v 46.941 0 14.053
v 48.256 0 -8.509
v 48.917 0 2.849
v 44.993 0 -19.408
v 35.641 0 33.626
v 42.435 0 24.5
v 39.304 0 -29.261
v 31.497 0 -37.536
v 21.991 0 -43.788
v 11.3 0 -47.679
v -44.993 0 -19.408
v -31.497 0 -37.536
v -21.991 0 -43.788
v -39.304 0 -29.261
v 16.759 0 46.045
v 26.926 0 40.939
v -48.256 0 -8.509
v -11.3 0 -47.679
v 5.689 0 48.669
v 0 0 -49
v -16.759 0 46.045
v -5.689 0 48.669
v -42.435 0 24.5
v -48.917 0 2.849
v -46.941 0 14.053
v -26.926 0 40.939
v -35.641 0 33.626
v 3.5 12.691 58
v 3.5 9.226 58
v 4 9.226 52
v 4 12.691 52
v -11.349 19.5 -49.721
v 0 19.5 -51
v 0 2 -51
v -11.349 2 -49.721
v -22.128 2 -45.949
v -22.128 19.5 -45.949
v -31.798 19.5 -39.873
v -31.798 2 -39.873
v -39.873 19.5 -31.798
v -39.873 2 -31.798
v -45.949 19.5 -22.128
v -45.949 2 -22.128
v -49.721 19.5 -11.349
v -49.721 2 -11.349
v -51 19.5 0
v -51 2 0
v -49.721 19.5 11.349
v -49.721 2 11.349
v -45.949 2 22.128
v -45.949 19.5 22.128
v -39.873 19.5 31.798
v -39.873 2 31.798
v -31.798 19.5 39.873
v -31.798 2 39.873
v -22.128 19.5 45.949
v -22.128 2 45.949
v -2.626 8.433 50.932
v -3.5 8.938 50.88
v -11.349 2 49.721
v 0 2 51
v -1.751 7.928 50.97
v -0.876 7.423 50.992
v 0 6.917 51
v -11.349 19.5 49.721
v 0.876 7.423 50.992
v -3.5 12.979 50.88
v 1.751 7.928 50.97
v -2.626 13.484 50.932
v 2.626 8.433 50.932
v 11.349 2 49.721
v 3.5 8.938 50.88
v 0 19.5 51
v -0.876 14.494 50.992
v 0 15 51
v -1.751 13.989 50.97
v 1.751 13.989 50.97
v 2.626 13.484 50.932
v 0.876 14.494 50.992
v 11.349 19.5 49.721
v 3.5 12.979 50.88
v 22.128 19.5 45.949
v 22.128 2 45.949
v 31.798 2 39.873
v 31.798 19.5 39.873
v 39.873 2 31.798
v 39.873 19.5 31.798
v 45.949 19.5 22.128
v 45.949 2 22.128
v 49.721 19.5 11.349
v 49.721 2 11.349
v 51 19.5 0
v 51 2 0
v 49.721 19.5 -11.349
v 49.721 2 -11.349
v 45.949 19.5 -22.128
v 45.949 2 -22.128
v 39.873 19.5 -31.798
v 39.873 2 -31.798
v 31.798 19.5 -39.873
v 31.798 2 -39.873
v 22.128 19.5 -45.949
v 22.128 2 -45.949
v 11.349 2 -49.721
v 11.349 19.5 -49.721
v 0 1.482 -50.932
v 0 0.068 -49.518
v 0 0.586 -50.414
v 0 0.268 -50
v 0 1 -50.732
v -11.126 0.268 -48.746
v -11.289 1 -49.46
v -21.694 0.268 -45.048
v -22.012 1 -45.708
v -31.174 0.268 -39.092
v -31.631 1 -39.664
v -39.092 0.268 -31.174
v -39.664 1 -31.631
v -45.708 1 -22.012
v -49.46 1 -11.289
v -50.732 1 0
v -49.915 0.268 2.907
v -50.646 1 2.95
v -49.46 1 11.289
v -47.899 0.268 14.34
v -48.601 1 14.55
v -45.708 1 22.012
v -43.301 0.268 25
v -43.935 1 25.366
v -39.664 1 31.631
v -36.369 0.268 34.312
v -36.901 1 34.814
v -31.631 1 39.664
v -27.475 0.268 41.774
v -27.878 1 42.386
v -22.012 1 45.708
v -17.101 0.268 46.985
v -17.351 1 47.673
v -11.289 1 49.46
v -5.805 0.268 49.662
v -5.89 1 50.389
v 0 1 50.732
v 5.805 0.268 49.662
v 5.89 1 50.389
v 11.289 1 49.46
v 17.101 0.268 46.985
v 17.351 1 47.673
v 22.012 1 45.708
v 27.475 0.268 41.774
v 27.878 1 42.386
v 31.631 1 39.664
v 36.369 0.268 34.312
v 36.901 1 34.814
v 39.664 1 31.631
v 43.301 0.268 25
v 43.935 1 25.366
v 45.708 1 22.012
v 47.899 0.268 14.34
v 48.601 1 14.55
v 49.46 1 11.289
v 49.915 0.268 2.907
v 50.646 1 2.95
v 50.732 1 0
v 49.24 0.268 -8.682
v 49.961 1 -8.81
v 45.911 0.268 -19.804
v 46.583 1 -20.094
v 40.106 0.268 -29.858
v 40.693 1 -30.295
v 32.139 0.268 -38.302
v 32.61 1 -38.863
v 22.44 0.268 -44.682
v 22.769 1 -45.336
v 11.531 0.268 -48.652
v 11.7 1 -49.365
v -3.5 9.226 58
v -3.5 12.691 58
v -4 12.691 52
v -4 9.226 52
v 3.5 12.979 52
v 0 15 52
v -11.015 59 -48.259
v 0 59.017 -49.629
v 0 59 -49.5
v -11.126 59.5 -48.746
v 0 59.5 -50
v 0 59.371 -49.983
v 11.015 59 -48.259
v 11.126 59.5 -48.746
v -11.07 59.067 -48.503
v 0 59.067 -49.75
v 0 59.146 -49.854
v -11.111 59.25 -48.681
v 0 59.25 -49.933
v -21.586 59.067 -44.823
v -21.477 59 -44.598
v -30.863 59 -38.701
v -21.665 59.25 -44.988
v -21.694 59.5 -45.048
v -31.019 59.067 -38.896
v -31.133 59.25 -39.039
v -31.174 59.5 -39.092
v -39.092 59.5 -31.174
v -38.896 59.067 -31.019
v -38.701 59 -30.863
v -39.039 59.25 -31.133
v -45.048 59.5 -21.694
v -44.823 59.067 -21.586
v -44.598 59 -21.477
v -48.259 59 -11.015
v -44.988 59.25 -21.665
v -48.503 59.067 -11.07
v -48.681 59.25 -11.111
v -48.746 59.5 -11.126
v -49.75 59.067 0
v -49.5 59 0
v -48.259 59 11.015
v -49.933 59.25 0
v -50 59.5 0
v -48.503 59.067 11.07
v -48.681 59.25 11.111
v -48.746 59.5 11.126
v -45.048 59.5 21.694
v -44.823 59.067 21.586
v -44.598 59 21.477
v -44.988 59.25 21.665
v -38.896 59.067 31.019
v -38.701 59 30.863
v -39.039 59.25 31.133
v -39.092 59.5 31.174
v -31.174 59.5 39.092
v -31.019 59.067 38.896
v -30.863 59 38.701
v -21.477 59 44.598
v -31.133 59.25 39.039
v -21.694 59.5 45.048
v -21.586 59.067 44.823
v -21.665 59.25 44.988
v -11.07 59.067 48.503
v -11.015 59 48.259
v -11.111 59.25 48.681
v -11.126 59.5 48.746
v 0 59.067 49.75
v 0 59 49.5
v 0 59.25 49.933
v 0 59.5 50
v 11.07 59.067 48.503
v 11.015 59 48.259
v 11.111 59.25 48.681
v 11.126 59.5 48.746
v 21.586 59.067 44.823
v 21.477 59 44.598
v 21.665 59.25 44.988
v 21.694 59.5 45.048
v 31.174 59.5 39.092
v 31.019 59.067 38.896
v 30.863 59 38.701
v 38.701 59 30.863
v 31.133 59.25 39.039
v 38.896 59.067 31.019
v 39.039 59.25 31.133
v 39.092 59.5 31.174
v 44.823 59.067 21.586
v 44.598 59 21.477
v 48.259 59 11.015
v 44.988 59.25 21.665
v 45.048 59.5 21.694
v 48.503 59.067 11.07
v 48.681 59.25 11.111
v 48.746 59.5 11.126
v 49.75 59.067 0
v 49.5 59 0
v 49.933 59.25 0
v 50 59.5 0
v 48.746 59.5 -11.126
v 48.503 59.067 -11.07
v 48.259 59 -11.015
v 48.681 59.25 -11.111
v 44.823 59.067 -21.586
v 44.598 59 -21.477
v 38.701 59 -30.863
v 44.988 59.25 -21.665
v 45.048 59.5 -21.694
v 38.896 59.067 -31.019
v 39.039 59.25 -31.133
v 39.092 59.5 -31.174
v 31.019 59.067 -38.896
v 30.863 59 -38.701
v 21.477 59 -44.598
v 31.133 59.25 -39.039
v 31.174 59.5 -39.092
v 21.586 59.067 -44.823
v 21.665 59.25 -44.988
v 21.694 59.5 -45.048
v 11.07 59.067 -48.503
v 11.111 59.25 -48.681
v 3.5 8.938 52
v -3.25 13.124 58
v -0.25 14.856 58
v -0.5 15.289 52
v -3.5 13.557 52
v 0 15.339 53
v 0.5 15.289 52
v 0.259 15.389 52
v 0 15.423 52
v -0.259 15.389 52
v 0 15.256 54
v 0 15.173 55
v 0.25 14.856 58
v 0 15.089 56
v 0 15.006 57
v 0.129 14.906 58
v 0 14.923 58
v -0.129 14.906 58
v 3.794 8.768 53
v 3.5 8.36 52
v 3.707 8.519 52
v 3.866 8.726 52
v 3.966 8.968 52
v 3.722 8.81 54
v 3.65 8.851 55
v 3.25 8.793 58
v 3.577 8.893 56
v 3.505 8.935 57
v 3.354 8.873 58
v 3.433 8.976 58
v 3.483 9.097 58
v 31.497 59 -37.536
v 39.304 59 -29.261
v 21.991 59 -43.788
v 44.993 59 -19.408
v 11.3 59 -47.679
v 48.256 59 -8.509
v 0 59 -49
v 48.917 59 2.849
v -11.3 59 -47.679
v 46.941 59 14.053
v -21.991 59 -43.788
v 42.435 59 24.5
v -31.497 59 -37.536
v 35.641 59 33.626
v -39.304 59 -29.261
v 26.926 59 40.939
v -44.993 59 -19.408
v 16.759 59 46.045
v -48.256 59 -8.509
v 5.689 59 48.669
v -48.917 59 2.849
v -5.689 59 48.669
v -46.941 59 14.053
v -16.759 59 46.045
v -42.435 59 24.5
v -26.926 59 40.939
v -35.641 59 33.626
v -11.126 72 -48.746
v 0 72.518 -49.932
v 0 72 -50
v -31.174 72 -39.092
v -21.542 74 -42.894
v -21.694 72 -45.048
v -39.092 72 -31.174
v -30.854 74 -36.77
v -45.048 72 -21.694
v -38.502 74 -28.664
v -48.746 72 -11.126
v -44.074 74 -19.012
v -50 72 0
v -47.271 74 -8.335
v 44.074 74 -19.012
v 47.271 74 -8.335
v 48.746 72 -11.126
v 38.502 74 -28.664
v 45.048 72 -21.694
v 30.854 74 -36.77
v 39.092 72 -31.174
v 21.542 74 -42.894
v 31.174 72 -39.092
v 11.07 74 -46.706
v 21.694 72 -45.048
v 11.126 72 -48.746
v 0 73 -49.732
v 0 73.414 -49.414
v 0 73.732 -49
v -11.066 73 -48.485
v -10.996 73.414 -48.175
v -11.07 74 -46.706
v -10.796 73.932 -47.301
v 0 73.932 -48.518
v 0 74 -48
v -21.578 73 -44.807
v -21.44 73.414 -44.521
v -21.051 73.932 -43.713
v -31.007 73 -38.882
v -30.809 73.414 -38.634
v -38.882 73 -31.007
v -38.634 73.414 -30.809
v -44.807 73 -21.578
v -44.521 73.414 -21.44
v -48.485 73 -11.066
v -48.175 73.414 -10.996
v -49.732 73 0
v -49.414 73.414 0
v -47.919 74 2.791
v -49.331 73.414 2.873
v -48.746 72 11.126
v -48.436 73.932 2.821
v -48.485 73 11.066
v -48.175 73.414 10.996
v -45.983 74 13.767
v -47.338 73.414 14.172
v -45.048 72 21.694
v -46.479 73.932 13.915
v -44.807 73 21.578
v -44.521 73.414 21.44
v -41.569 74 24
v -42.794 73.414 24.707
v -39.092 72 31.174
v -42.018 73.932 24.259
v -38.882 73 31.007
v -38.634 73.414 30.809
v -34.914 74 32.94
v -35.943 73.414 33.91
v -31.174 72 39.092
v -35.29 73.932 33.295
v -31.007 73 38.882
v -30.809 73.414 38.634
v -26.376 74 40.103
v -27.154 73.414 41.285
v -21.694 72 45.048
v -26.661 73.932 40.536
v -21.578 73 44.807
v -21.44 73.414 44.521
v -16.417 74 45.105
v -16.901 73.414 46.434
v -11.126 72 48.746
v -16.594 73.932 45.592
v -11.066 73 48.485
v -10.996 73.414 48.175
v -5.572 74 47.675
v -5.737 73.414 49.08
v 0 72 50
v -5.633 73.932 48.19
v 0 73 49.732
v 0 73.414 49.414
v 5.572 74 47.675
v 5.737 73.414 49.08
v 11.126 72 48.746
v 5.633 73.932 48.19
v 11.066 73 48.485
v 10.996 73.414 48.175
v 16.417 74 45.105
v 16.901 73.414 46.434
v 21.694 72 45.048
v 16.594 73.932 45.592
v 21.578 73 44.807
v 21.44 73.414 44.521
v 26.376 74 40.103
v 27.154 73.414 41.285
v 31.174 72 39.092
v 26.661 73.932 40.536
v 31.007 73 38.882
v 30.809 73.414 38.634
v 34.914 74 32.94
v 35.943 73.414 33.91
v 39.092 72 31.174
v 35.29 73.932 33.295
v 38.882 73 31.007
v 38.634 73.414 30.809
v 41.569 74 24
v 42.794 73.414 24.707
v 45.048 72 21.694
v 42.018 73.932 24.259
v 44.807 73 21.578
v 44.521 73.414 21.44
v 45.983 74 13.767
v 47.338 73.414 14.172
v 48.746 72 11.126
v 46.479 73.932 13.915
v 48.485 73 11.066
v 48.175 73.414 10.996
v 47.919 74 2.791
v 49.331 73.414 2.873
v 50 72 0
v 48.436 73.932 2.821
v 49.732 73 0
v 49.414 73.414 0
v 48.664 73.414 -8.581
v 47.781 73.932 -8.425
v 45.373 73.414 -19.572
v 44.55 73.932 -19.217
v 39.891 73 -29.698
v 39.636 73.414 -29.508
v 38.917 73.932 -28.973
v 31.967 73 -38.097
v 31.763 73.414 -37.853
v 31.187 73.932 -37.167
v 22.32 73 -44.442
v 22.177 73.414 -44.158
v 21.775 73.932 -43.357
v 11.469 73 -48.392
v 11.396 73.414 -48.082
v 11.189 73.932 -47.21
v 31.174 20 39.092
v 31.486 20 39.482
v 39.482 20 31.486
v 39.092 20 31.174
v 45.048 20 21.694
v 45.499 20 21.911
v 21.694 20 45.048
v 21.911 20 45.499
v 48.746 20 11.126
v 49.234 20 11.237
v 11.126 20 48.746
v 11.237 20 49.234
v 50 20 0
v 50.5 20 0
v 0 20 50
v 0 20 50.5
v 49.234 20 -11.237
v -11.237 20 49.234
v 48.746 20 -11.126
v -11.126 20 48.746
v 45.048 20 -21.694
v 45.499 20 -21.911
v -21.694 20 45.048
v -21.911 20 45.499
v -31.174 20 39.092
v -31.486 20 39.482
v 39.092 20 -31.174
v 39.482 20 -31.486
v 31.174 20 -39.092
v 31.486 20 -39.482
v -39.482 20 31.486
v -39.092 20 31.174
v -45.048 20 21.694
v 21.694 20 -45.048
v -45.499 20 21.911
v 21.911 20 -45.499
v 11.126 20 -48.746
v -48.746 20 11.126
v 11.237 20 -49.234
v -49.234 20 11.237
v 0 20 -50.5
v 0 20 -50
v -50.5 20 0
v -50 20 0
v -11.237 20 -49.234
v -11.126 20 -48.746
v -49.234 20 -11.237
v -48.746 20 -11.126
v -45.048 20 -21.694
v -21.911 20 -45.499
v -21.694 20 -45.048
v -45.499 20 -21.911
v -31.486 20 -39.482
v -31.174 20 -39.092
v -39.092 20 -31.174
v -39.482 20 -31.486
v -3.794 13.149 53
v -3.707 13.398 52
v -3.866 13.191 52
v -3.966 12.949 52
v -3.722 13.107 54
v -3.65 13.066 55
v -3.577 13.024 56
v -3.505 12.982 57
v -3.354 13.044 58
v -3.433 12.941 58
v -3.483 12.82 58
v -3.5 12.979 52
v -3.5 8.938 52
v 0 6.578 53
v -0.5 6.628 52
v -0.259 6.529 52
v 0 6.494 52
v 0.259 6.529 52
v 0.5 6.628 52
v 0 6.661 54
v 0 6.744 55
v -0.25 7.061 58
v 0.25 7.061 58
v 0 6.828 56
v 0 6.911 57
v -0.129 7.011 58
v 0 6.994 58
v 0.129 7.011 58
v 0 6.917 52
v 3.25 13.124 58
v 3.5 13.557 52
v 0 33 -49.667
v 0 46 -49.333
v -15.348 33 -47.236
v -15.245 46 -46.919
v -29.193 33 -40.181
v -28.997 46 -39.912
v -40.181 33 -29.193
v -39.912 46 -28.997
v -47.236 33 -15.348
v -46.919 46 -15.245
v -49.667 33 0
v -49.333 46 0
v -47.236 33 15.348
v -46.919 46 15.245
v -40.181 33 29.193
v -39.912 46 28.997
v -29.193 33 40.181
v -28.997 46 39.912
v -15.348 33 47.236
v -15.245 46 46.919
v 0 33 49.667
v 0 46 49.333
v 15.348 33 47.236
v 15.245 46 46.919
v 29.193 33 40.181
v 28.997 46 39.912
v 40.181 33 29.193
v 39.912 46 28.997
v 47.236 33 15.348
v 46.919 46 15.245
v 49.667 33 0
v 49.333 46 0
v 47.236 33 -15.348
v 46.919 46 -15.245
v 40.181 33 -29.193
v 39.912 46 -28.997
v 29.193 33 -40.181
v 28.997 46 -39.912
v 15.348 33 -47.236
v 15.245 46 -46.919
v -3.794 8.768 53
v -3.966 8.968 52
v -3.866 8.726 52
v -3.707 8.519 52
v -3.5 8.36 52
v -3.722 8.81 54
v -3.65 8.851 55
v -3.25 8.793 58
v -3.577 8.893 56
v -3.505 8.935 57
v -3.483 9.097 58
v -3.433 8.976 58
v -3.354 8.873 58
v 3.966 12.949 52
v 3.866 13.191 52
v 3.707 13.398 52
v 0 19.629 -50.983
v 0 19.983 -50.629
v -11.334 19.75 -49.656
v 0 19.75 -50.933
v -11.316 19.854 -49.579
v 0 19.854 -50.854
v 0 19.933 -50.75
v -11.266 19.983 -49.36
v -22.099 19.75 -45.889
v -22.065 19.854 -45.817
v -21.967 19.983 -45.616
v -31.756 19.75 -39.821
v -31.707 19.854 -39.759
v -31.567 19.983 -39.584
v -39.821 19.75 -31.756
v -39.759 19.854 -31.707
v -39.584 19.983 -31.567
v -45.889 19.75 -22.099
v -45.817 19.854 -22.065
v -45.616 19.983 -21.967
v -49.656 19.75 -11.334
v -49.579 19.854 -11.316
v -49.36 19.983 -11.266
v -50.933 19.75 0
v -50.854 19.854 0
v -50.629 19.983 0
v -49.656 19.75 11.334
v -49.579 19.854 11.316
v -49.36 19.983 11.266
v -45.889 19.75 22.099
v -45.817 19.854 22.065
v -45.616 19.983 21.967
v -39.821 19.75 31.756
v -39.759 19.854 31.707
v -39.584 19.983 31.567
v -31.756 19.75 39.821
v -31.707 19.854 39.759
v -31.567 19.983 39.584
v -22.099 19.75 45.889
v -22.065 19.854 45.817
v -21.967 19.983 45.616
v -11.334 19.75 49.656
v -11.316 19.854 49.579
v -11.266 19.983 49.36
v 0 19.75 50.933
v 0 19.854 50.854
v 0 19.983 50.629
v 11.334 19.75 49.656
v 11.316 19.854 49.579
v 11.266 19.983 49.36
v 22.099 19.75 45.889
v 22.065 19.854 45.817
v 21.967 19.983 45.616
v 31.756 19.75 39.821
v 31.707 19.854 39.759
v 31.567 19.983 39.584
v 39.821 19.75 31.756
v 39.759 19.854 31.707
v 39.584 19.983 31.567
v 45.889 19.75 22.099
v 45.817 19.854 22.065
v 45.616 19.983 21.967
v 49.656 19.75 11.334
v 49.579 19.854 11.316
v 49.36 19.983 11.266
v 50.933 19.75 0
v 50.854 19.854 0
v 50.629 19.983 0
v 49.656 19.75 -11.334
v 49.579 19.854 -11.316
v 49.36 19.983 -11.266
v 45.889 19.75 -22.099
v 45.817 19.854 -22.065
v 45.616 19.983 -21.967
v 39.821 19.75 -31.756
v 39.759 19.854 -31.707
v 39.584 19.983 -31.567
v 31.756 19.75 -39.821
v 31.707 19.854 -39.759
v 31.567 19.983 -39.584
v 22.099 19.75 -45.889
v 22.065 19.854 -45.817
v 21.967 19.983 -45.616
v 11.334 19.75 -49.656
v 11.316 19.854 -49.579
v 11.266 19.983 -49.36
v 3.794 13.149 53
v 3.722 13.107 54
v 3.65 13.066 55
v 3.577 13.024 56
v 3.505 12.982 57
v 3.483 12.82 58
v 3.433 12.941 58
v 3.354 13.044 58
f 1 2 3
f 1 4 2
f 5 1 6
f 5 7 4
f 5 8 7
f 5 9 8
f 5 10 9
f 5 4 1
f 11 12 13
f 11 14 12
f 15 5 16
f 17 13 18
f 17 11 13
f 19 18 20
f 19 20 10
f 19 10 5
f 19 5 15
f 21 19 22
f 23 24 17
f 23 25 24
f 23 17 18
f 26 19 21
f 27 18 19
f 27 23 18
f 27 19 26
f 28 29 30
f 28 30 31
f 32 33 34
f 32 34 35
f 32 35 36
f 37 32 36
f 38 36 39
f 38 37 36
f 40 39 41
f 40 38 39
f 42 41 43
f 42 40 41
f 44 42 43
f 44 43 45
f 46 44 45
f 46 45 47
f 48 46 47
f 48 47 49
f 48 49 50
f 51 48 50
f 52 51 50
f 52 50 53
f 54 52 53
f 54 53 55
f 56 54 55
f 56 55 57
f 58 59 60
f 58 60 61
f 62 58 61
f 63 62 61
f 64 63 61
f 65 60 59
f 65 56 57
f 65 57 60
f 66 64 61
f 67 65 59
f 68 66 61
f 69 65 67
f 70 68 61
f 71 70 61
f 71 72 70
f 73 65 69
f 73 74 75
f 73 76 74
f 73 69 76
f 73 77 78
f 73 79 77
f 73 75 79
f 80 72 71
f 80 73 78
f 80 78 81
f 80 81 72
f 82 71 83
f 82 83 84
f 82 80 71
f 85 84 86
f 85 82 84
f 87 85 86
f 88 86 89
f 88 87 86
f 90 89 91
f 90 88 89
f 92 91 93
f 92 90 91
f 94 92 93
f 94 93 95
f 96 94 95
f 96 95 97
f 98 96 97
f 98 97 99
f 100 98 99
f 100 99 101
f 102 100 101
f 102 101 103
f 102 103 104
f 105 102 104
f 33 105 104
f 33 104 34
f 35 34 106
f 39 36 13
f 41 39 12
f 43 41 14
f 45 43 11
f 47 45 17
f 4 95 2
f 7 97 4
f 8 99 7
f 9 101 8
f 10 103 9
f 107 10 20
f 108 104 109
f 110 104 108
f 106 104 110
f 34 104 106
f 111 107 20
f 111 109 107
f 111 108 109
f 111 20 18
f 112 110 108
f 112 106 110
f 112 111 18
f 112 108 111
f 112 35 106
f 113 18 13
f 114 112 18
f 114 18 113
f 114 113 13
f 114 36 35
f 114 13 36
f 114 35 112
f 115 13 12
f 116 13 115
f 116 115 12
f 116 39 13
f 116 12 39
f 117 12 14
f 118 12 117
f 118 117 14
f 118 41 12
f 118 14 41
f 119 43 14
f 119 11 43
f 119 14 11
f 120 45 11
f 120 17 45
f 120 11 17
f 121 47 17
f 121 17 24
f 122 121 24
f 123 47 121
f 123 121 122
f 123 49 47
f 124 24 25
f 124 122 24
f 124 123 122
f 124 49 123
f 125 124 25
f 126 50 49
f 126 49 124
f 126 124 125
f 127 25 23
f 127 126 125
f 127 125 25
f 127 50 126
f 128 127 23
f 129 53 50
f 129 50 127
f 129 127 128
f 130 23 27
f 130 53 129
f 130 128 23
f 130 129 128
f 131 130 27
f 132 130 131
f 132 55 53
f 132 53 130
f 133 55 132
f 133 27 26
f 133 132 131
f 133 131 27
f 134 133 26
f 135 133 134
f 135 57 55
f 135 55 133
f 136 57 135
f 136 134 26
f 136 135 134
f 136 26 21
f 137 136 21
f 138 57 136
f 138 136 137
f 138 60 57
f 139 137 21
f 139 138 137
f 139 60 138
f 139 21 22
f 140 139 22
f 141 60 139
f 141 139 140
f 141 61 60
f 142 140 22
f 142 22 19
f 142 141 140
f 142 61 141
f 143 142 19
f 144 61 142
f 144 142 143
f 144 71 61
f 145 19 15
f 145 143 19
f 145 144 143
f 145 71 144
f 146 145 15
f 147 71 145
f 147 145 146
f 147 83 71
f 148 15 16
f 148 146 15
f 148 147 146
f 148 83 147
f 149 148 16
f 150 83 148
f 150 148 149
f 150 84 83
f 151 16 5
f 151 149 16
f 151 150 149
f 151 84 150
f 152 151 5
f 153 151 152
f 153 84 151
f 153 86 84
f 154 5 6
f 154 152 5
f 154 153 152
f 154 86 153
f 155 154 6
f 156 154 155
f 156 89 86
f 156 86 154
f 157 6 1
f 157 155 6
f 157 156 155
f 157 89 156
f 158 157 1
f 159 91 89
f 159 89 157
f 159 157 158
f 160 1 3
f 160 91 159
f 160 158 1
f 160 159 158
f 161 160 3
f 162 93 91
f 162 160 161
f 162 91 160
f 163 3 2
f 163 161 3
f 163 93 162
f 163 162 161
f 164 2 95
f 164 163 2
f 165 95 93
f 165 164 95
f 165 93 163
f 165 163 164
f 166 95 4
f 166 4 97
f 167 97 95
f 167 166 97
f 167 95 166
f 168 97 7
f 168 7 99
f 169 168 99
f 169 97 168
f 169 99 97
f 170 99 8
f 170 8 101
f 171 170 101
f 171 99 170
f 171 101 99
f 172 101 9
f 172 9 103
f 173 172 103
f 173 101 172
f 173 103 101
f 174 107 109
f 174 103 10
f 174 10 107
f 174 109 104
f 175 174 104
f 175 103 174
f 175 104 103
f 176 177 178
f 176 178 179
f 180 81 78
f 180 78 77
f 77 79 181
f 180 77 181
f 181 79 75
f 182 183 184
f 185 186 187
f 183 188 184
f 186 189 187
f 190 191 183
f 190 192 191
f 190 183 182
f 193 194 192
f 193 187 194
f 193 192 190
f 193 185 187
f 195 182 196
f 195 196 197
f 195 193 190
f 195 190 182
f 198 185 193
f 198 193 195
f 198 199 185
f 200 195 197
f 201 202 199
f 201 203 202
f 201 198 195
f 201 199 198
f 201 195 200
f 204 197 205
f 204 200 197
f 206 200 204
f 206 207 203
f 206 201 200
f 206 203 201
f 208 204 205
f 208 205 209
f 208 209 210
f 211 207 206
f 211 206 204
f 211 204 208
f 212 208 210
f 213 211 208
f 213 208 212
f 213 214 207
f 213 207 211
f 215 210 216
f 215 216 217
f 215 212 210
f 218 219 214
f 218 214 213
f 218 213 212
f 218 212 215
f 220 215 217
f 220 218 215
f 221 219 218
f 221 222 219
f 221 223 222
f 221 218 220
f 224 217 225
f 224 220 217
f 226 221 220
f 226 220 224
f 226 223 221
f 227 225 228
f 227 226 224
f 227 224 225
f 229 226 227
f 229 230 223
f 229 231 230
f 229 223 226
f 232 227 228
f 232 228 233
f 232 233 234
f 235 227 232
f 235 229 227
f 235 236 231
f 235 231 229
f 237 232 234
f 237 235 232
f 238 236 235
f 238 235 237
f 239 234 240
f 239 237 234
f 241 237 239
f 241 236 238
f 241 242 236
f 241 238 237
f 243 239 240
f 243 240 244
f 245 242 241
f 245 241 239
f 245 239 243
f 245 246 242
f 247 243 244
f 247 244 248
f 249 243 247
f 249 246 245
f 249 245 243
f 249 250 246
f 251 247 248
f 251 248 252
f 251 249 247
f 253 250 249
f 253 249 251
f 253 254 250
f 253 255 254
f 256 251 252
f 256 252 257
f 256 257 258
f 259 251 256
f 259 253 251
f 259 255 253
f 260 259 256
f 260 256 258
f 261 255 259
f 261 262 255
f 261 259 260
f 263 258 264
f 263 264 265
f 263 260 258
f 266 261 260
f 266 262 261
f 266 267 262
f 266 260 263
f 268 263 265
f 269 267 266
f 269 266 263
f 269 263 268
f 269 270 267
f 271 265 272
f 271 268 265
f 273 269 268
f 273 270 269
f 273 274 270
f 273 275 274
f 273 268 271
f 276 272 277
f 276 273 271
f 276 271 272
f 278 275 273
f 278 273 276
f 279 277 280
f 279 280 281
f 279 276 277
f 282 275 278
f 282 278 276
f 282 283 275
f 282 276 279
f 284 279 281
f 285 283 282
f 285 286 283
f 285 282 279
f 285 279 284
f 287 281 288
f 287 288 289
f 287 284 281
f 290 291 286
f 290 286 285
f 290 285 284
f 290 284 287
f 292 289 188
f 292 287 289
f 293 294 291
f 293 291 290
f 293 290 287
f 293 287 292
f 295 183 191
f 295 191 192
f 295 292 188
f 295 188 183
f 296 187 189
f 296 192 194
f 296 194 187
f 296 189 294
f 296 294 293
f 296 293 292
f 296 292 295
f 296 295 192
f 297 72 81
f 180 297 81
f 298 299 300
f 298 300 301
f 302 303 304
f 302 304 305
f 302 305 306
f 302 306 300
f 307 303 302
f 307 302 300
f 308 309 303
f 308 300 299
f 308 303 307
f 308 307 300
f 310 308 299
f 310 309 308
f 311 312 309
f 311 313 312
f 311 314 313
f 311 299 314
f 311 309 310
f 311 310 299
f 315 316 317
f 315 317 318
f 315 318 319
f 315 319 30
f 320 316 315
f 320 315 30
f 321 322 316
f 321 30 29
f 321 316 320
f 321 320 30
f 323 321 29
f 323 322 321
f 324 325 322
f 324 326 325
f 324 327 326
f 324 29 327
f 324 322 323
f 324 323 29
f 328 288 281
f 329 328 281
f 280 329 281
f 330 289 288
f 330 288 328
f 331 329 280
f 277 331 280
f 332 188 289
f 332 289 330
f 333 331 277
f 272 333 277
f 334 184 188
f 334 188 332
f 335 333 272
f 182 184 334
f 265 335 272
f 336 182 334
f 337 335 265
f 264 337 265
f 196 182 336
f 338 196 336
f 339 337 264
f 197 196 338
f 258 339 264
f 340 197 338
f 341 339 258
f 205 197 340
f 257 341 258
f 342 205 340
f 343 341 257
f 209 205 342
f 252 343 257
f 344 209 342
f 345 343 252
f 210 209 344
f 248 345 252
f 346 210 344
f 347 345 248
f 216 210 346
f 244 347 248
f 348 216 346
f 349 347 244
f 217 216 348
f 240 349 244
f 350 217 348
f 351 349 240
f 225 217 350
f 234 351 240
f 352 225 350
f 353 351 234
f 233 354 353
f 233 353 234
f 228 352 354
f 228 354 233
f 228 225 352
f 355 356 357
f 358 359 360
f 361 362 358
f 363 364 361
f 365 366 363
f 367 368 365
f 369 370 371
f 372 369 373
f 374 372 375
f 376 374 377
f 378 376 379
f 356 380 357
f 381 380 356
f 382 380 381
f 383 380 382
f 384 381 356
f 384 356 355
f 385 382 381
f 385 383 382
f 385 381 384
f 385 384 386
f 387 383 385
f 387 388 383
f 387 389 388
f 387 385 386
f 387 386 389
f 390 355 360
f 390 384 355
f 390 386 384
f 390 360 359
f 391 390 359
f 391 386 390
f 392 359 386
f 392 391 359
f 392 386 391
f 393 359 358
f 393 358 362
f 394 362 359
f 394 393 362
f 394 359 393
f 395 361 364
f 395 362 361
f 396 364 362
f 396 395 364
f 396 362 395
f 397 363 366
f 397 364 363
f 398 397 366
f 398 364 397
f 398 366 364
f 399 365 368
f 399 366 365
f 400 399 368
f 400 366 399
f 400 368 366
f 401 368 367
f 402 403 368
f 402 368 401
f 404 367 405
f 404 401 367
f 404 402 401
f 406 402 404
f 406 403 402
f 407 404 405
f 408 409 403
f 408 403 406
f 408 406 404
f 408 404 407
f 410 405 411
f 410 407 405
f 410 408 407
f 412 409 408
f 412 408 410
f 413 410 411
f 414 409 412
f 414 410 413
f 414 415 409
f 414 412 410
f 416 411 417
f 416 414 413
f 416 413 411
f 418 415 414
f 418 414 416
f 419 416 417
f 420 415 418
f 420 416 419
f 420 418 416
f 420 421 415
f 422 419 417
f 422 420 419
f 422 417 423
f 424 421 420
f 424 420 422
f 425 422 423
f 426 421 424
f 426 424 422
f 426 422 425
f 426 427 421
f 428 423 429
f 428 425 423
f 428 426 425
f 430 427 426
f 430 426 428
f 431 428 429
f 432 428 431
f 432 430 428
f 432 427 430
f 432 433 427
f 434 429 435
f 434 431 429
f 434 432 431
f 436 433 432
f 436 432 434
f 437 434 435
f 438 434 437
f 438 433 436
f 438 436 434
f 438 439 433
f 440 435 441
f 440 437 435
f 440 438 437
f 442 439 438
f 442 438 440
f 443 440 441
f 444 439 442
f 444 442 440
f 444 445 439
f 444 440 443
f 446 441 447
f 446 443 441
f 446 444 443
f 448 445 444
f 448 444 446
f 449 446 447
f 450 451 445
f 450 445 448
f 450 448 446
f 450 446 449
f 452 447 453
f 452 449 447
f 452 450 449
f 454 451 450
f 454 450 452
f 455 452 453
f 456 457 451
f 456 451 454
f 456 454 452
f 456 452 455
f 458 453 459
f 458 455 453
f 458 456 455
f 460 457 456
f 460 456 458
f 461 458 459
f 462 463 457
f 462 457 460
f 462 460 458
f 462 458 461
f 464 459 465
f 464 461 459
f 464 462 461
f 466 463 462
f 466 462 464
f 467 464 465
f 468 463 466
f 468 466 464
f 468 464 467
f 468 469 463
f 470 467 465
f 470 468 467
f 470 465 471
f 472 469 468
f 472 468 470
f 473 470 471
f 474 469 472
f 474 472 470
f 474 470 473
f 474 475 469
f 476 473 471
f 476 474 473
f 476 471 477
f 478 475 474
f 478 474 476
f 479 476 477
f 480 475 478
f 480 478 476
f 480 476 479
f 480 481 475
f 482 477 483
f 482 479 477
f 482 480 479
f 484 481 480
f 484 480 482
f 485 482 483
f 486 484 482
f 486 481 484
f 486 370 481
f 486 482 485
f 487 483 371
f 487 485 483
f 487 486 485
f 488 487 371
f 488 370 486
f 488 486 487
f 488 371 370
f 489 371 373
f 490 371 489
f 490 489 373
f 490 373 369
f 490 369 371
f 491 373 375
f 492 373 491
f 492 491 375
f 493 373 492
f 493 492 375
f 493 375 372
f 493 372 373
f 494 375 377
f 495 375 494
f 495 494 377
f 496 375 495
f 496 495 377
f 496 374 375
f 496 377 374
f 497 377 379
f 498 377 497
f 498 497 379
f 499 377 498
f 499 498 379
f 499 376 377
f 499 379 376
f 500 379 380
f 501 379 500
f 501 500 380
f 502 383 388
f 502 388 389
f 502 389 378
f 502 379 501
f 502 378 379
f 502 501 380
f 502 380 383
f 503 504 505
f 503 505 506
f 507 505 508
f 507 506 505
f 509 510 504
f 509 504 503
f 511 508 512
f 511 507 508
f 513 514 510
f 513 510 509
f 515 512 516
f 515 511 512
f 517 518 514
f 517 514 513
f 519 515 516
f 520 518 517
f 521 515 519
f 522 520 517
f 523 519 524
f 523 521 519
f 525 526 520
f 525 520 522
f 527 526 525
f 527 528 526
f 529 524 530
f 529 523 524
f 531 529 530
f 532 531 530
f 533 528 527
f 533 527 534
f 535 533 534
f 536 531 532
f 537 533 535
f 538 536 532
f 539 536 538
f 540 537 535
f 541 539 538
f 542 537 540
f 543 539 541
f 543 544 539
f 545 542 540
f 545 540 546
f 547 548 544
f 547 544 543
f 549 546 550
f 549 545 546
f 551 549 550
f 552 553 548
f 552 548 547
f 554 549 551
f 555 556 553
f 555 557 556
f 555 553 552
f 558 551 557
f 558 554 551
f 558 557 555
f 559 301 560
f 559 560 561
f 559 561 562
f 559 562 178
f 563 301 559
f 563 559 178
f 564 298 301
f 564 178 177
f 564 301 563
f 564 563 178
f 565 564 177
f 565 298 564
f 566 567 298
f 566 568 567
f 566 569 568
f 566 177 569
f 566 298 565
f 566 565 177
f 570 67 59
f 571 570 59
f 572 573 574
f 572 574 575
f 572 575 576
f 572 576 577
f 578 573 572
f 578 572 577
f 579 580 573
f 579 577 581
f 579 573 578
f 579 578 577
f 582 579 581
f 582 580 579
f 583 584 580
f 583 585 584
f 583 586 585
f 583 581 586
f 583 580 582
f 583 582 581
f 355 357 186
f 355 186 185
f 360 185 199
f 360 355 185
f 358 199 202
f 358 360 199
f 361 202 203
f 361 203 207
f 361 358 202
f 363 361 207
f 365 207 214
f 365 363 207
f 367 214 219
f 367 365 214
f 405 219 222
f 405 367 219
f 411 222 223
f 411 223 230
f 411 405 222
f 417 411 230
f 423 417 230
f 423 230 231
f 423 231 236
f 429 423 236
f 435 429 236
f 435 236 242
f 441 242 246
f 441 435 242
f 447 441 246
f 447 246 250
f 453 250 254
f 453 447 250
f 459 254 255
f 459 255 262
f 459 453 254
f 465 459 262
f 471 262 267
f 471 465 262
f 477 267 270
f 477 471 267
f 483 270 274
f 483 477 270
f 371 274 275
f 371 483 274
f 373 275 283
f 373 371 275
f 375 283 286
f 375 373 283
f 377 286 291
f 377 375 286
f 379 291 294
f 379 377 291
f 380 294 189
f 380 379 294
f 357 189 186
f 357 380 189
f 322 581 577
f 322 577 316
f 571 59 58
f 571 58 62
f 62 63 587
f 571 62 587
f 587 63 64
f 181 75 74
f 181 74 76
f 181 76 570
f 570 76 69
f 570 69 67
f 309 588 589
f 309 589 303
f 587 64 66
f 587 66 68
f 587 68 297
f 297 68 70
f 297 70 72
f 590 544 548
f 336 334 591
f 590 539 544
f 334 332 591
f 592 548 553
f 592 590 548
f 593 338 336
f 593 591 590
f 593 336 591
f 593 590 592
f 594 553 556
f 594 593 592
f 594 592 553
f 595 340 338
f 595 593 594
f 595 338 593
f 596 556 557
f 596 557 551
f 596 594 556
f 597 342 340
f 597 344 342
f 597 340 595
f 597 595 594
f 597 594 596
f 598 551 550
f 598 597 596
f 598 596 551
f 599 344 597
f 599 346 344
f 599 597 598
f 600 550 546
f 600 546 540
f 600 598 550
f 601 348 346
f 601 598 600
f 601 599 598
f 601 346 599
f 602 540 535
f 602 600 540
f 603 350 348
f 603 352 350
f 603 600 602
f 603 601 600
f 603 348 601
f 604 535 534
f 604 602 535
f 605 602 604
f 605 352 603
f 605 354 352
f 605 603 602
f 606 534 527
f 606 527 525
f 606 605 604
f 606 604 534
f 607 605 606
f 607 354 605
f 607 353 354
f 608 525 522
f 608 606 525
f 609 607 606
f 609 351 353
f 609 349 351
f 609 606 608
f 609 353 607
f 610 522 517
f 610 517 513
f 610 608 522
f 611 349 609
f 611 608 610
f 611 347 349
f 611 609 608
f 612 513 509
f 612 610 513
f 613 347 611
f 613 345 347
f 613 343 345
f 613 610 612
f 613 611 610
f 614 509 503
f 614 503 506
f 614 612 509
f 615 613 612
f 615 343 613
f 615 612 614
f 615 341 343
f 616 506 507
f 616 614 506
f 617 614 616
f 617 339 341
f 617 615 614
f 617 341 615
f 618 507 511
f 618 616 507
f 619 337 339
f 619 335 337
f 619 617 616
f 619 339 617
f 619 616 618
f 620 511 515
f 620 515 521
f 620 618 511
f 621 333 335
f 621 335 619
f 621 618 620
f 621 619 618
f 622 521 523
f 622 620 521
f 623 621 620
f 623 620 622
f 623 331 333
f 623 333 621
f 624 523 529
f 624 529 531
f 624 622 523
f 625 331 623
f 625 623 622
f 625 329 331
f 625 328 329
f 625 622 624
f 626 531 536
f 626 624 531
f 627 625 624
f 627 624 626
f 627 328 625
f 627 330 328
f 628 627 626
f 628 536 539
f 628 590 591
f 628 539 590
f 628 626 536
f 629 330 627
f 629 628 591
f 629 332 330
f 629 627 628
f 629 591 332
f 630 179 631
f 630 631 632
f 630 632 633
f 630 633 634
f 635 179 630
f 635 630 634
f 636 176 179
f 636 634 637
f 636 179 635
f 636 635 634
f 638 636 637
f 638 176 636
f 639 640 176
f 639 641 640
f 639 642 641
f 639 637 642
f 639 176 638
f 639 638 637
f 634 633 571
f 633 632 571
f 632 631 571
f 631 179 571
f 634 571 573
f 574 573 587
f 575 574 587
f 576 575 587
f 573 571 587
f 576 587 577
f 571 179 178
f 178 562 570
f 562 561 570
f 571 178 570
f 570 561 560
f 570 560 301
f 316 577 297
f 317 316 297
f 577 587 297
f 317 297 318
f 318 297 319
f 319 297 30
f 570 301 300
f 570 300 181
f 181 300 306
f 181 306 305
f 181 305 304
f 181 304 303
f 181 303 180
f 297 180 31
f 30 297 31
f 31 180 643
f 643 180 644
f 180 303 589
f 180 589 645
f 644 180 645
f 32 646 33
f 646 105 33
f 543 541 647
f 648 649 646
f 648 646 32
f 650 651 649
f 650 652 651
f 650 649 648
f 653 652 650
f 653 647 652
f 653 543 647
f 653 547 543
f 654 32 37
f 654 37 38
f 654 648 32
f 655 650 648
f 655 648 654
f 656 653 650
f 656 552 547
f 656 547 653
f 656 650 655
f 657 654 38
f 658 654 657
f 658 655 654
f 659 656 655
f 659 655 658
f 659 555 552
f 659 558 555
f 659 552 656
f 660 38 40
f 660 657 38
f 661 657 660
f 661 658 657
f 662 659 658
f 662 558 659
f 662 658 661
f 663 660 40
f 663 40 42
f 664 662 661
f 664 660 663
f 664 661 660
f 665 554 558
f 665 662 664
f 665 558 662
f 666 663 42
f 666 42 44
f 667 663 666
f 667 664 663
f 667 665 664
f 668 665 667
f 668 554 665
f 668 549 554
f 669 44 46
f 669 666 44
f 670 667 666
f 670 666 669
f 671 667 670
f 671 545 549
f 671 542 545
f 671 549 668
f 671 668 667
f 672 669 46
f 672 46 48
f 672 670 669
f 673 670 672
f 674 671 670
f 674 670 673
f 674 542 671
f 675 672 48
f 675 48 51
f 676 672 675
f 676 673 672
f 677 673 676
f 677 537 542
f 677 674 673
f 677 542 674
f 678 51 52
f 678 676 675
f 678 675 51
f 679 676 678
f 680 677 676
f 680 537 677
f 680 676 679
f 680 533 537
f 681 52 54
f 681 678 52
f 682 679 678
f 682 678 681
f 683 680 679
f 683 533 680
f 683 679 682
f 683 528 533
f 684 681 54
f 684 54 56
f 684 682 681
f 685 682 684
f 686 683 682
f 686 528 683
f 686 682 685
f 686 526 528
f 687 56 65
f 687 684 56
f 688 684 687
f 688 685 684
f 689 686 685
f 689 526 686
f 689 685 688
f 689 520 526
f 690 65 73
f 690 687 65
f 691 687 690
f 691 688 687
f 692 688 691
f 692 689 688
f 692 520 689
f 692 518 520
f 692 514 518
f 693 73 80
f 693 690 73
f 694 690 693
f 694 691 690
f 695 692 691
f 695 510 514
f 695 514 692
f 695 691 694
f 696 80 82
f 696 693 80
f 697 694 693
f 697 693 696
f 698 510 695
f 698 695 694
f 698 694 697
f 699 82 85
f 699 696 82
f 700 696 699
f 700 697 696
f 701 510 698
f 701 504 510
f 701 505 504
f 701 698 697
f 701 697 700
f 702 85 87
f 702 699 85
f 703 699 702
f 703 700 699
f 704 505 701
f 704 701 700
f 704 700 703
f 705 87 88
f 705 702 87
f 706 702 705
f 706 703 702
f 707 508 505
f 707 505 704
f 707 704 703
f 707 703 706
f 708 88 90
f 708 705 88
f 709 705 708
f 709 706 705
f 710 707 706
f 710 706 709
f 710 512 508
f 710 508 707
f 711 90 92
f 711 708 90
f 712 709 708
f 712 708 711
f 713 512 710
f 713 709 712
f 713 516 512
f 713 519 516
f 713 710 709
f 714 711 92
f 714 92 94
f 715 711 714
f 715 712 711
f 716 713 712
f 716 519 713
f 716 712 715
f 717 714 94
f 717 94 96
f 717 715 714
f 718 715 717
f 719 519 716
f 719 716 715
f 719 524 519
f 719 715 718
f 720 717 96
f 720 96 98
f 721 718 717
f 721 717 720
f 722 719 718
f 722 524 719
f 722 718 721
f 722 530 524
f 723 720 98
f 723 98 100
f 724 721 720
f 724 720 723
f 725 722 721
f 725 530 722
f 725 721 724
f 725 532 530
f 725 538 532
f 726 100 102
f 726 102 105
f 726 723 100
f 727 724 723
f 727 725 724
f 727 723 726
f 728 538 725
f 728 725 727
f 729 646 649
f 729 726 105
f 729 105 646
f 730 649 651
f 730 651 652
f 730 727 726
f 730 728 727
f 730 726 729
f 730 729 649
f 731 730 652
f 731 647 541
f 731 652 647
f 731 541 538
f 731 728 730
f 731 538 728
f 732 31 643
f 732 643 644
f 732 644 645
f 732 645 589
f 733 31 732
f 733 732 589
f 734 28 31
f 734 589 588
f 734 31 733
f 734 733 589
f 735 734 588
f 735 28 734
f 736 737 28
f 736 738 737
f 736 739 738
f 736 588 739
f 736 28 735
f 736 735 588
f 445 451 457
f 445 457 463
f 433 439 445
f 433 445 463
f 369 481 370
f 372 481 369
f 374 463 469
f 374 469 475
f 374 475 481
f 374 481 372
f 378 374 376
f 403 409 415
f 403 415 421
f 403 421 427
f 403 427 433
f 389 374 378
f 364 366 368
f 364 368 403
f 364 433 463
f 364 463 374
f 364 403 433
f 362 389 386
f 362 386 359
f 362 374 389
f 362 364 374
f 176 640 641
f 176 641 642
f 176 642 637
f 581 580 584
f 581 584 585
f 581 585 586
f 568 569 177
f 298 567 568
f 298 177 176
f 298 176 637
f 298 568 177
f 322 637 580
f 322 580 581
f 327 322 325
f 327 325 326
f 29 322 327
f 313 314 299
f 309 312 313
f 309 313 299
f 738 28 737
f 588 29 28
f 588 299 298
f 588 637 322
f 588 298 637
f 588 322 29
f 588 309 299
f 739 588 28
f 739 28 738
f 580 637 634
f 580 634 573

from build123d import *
from OCP.BRepFilletAPI import BRepFilletAPI_MakeChamfer

# Parameters (mm, degrees)
FILLET_1_R       = 2
FILLET_2_R       = 0.5
EXTRUDE_1_DEPTH  = 52
EXTRUDE_2_DEPTH  = 6
FILLET_3_R       = 1
CHAMFER_1_SIZE   = 6
CHAMFER_1_SIZE_2 = 0.5


with BuildPart() as part:
    # 스케치1 → 회전1 (revolve)
    with BuildSketch(Plane.XY, mode=Mode.PRIVATE) as revolve_1_sk:
        Polygon((0, 0), (51, 0), (51, 20), (50, 20), (49, 59), (50, 59), (50, 74), (0, 74), align=None)
    revolve(revolve_1_sk.sketch.rotate(Axis((0, 0, 0), (0, 1, 0)), 90), axis=Axis((0, 0, 0), (0, 1, 0)))

    # 필렛1
    fillet_1_edges = [part.edges().sort_by_distance(p)[0] for p in [
        (0, 74, 50),
        (0, 0, 51),
    ]]
    fillet(fillet_1_edges, radius=FILLET_1_R)

    # 필렛2
    fillet_2_edges = [part.edges().sort_by_distance(p)[0] for p in [
        (0, 59, 50),
        (0, 20, 51),
    ]]
    fillet(fillet_2_edges, radius=FILLET_2_R)

    # 스케치2 → 보스-돌출1 (add)
    with BuildSketch(Plane.XY):
        Polygon((0, 6.917096231), (3.5, 8.937822174), (3.5, 12.979274058), (0, 15), (-3.5, 12.979274058), (-3.5, 8.937822174), align=None)
    extrude(amount=EXTRUDE_1_DEPTH)

    # 스케치3 → 보스-돌출2 (add)
    with BuildSketch(Plane.XY.offset(52)):
        Polygon((-4, 8.649147039), (0, 6.339745962), (4, 8.649147039), (4, 13.267949192), (0, 15.577350269), (-4, 13.267949192), align=None)
    extrude(amount=EXTRUDE_2_DEPTH)

    # 필렛3
    fillet_3_edges = [part.edges().sort_by_distance(p)[0] for p in [
        (-4, 13.267949192, 55),
        (-4, 8.649147039, 55),
        (0, 6.339745962, 55),
        (4, 8.649147039, 55),
        (4, 13.267949192, 55),
        (0, 15.577350269, 55),
    ]]
    fillet(fillet_3_edges, radius=FILLET_3_R)

    # 모따기1
    chamfer_1_edges_1 = [part.edges().sort_by_distance(p)[0] for p in [
        (-2, 7.494446501, 58),
    ]]
    chamfer_1_side_1 = [part.faces().sort_by_distance(p)[0] for p in [
        (-2, 7.494446501, 57.99),
    ]]
    chamfer_1_edges_2 = [part.edges().sort_by_distance(p)[0] for p in [
        (0, 6.494446501, 58),
    ]]
    chamfer_1_side_2 = [part.faces().sort_by_distance(p)[0] for p in [
        (0, 6.494446501, 57.99),
    ]]
    chamfer_1_edges_3 = [part.edges().sort_by_distance(p)[0] for p in [
        (-3.866025404, 8.726497308, 58),
    ]]
    chamfer_1_side_3 = [part.faces().sort_by_distance(p)[0] for p in [
        (-3.866025404, 8.726497308, 57.99),
    ]]
    chamfer_1_edges_4 = [part.edges().sort_by_distance(p)[0] for p in [
        (2, 7.494446501, 58),
    ]]
    chamfer_1_side_4 = [part.faces().sort_by_distance(p)[0] for p in [
        (1.995, 7.503106755, 58),
    ]]
    chamfer_1_edges_5 = [part.edges().sort_by_distance(p)[0] for p in [
        (-4, 10.958548116, 58),
    ]]
    chamfer_1_side_5 = [part.faces().sort_by_distance(p)[0] for p in [
        (-3.99, 10.958548116, 58),
    ]]
    chamfer_1_edges_6 = [part.edges().sort_by_distance(p)[0] for p in [
        (3.866025404, 8.726497308, 58),
    ]]
    chamfer_1_side_6 = [part.faces().sort_by_distance(p)[0] for p in [
        (3.85736515, 8.731497308, 58),
    ]]
    chamfer_1_edges_7 = [part.edges().sort_by_distance(p)[0] for p in [
        (-3.866025404, 13.190598923, 58),
    ]]
    chamfer_1_side_7 = [part.faces().sort_by_distance(p)[0] for p in [
        (-3.85736515, 13.185598923, 58),
    ]]
    chamfer_1_edges_8 = [part.edges().sort_by_distance(p)[0] for p in [
        (4, 10.958548116, 58),
    ]]
    chamfer_1_side_8 = [part.faces().sort_by_distance(p)[0] for p in [
        (3.99, 10.958548116, 58),
    ]]
    chamfer_1_edges_9 = [part.edges().sort_by_distance(p)[0] for p in [
        (-2, 14.422649731, 58),
    ]]
    chamfer_1_side_9 = [part.faces().sort_by_distance(p)[0] for p in [
        (-1.995, 14.413989477, 58),
    ]]
    chamfer_1_edges_10 = [part.edges().sort_by_distance(p)[0] for p in [
        (3.866025404, 13.190598923, 58),
    ]]
    chamfer_1_side_10 = [part.faces().sort_by_distance(p)[0] for p in [
        (3.85736515, 13.185598923, 58),
    ]]
    chamfer_1_edges_11 = [part.edges().sort_by_distance(p)[0] for p in [
        (0, 15.422649731, 58),
    ]]
    chamfer_1_side_11 = [part.faces().sort_by_distance(p)[0] for p in [
        (0, 15.412649731, 58),
    ]]
    chamfer_1_edges_12 = [part.edges().sort_by_distance(p)[0] for p in [
        (2, 14.422649731, 58),
    ]]
    chamfer_1_side_12 = [part.faces().sort_by_distance(p)[0] for p in [
        (1.995, 14.413989477, 58),
    ]]
    chamfer_1 = BRepFilletAPI_MakeChamfer(part.part.solid().wrapped)
    for e in chamfer_1_edges_1:
        chamfer_1.Add(CHAMFER_1_SIZE - 0.0001, CHAMFER_1_SIZE_2 - 0.0001, e.wrapped, chamfer_1_side_1[0].wrapped)
    for e in chamfer_1_edges_2:
        chamfer_1.Add(CHAMFER_1_SIZE - 0.0001, CHAMFER_1_SIZE_2 - 0.0001, e.wrapped, chamfer_1_side_2[0].wrapped)
    for e in chamfer_1_edges_3:
        chamfer_1.Add(CHAMFER_1_SIZE - 0.0001, CHAMFER_1_SIZE_2 - 0.0001, e.wrapped, chamfer_1_side_3[0].wrapped)
    for e in chamfer_1_edges_4:
        chamfer_1.Add(CHAMFER_1_SIZE_2 - 0.0001, CHAMFER_1_SIZE - 0.0001, e.wrapped, chamfer_1_side_4[0].wrapped)
    for e in chamfer_1_edges_5:
        chamfer_1.Add(CHAMFER_1_SIZE_2 - 0.0001, CHAMFER_1_SIZE - 0.0001, e.wrapped, chamfer_1_side_5[0].wrapped)
    for e in chamfer_1_edges_6:
        chamfer_1.Add(CHAMFER_1_SIZE_2 - 0.0001, CHAMFER_1_SIZE - 0.0001, e.wrapped, chamfer_1_side_6[0].wrapped)
    for e in chamfer_1_edges_7:
        chamfer_1.Add(CHAMFER_1_SIZE_2 - 0.0001, CHAMFER_1_SIZE - 0.0001, e.wrapped, chamfer_1_side_7[0].wrapped)
    for e in chamfer_1_edges_8:
        chamfer_1.Add(CHAMFER_1_SIZE_2 - 0.0001, CHAMFER_1_SIZE - 0.0001, e.wrapped, chamfer_1_side_8[0].wrapped)
    for e in chamfer_1_edges_9:
        chamfer_1.Add(CHAMFER_1_SIZE_2 - 0.0001, CHAMFER_1_SIZE - 0.0001, e.wrapped, chamfer_1_side_9[0].wrapped)
    for e in chamfer_1_edges_10:
        chamfer_1.Add(CHAMFER_1_SIZE_2 - 0.0001, CHAMFER_1_SIZE - 0.0001, e.wrapped, chamfer_1_side_10[0].wrapped)
    for e in chamfer_1_edges_11:
        chamfer_1.Add(CHAMFER_1_SIZE_2 - 0.0001, CHAMFER_1_SIZE - 0.0001, e.wrapped, chamfer_1_side_11[0].wrapped)
    for e in chamfer_1_edges_12:
        chamfer_1.Add(CHAMFER_1_SIZE_2 - 0.0001, CHAMFER_1_SIZE - 0.0001, e.wrapped, chamfer_1_side_12[0].wrapped)
    add(Compound.cast(chamfer_1.Shape()), mode=Mode.REPLACE)  # a hair under: the kernel refuses the full size


solid = part.part
